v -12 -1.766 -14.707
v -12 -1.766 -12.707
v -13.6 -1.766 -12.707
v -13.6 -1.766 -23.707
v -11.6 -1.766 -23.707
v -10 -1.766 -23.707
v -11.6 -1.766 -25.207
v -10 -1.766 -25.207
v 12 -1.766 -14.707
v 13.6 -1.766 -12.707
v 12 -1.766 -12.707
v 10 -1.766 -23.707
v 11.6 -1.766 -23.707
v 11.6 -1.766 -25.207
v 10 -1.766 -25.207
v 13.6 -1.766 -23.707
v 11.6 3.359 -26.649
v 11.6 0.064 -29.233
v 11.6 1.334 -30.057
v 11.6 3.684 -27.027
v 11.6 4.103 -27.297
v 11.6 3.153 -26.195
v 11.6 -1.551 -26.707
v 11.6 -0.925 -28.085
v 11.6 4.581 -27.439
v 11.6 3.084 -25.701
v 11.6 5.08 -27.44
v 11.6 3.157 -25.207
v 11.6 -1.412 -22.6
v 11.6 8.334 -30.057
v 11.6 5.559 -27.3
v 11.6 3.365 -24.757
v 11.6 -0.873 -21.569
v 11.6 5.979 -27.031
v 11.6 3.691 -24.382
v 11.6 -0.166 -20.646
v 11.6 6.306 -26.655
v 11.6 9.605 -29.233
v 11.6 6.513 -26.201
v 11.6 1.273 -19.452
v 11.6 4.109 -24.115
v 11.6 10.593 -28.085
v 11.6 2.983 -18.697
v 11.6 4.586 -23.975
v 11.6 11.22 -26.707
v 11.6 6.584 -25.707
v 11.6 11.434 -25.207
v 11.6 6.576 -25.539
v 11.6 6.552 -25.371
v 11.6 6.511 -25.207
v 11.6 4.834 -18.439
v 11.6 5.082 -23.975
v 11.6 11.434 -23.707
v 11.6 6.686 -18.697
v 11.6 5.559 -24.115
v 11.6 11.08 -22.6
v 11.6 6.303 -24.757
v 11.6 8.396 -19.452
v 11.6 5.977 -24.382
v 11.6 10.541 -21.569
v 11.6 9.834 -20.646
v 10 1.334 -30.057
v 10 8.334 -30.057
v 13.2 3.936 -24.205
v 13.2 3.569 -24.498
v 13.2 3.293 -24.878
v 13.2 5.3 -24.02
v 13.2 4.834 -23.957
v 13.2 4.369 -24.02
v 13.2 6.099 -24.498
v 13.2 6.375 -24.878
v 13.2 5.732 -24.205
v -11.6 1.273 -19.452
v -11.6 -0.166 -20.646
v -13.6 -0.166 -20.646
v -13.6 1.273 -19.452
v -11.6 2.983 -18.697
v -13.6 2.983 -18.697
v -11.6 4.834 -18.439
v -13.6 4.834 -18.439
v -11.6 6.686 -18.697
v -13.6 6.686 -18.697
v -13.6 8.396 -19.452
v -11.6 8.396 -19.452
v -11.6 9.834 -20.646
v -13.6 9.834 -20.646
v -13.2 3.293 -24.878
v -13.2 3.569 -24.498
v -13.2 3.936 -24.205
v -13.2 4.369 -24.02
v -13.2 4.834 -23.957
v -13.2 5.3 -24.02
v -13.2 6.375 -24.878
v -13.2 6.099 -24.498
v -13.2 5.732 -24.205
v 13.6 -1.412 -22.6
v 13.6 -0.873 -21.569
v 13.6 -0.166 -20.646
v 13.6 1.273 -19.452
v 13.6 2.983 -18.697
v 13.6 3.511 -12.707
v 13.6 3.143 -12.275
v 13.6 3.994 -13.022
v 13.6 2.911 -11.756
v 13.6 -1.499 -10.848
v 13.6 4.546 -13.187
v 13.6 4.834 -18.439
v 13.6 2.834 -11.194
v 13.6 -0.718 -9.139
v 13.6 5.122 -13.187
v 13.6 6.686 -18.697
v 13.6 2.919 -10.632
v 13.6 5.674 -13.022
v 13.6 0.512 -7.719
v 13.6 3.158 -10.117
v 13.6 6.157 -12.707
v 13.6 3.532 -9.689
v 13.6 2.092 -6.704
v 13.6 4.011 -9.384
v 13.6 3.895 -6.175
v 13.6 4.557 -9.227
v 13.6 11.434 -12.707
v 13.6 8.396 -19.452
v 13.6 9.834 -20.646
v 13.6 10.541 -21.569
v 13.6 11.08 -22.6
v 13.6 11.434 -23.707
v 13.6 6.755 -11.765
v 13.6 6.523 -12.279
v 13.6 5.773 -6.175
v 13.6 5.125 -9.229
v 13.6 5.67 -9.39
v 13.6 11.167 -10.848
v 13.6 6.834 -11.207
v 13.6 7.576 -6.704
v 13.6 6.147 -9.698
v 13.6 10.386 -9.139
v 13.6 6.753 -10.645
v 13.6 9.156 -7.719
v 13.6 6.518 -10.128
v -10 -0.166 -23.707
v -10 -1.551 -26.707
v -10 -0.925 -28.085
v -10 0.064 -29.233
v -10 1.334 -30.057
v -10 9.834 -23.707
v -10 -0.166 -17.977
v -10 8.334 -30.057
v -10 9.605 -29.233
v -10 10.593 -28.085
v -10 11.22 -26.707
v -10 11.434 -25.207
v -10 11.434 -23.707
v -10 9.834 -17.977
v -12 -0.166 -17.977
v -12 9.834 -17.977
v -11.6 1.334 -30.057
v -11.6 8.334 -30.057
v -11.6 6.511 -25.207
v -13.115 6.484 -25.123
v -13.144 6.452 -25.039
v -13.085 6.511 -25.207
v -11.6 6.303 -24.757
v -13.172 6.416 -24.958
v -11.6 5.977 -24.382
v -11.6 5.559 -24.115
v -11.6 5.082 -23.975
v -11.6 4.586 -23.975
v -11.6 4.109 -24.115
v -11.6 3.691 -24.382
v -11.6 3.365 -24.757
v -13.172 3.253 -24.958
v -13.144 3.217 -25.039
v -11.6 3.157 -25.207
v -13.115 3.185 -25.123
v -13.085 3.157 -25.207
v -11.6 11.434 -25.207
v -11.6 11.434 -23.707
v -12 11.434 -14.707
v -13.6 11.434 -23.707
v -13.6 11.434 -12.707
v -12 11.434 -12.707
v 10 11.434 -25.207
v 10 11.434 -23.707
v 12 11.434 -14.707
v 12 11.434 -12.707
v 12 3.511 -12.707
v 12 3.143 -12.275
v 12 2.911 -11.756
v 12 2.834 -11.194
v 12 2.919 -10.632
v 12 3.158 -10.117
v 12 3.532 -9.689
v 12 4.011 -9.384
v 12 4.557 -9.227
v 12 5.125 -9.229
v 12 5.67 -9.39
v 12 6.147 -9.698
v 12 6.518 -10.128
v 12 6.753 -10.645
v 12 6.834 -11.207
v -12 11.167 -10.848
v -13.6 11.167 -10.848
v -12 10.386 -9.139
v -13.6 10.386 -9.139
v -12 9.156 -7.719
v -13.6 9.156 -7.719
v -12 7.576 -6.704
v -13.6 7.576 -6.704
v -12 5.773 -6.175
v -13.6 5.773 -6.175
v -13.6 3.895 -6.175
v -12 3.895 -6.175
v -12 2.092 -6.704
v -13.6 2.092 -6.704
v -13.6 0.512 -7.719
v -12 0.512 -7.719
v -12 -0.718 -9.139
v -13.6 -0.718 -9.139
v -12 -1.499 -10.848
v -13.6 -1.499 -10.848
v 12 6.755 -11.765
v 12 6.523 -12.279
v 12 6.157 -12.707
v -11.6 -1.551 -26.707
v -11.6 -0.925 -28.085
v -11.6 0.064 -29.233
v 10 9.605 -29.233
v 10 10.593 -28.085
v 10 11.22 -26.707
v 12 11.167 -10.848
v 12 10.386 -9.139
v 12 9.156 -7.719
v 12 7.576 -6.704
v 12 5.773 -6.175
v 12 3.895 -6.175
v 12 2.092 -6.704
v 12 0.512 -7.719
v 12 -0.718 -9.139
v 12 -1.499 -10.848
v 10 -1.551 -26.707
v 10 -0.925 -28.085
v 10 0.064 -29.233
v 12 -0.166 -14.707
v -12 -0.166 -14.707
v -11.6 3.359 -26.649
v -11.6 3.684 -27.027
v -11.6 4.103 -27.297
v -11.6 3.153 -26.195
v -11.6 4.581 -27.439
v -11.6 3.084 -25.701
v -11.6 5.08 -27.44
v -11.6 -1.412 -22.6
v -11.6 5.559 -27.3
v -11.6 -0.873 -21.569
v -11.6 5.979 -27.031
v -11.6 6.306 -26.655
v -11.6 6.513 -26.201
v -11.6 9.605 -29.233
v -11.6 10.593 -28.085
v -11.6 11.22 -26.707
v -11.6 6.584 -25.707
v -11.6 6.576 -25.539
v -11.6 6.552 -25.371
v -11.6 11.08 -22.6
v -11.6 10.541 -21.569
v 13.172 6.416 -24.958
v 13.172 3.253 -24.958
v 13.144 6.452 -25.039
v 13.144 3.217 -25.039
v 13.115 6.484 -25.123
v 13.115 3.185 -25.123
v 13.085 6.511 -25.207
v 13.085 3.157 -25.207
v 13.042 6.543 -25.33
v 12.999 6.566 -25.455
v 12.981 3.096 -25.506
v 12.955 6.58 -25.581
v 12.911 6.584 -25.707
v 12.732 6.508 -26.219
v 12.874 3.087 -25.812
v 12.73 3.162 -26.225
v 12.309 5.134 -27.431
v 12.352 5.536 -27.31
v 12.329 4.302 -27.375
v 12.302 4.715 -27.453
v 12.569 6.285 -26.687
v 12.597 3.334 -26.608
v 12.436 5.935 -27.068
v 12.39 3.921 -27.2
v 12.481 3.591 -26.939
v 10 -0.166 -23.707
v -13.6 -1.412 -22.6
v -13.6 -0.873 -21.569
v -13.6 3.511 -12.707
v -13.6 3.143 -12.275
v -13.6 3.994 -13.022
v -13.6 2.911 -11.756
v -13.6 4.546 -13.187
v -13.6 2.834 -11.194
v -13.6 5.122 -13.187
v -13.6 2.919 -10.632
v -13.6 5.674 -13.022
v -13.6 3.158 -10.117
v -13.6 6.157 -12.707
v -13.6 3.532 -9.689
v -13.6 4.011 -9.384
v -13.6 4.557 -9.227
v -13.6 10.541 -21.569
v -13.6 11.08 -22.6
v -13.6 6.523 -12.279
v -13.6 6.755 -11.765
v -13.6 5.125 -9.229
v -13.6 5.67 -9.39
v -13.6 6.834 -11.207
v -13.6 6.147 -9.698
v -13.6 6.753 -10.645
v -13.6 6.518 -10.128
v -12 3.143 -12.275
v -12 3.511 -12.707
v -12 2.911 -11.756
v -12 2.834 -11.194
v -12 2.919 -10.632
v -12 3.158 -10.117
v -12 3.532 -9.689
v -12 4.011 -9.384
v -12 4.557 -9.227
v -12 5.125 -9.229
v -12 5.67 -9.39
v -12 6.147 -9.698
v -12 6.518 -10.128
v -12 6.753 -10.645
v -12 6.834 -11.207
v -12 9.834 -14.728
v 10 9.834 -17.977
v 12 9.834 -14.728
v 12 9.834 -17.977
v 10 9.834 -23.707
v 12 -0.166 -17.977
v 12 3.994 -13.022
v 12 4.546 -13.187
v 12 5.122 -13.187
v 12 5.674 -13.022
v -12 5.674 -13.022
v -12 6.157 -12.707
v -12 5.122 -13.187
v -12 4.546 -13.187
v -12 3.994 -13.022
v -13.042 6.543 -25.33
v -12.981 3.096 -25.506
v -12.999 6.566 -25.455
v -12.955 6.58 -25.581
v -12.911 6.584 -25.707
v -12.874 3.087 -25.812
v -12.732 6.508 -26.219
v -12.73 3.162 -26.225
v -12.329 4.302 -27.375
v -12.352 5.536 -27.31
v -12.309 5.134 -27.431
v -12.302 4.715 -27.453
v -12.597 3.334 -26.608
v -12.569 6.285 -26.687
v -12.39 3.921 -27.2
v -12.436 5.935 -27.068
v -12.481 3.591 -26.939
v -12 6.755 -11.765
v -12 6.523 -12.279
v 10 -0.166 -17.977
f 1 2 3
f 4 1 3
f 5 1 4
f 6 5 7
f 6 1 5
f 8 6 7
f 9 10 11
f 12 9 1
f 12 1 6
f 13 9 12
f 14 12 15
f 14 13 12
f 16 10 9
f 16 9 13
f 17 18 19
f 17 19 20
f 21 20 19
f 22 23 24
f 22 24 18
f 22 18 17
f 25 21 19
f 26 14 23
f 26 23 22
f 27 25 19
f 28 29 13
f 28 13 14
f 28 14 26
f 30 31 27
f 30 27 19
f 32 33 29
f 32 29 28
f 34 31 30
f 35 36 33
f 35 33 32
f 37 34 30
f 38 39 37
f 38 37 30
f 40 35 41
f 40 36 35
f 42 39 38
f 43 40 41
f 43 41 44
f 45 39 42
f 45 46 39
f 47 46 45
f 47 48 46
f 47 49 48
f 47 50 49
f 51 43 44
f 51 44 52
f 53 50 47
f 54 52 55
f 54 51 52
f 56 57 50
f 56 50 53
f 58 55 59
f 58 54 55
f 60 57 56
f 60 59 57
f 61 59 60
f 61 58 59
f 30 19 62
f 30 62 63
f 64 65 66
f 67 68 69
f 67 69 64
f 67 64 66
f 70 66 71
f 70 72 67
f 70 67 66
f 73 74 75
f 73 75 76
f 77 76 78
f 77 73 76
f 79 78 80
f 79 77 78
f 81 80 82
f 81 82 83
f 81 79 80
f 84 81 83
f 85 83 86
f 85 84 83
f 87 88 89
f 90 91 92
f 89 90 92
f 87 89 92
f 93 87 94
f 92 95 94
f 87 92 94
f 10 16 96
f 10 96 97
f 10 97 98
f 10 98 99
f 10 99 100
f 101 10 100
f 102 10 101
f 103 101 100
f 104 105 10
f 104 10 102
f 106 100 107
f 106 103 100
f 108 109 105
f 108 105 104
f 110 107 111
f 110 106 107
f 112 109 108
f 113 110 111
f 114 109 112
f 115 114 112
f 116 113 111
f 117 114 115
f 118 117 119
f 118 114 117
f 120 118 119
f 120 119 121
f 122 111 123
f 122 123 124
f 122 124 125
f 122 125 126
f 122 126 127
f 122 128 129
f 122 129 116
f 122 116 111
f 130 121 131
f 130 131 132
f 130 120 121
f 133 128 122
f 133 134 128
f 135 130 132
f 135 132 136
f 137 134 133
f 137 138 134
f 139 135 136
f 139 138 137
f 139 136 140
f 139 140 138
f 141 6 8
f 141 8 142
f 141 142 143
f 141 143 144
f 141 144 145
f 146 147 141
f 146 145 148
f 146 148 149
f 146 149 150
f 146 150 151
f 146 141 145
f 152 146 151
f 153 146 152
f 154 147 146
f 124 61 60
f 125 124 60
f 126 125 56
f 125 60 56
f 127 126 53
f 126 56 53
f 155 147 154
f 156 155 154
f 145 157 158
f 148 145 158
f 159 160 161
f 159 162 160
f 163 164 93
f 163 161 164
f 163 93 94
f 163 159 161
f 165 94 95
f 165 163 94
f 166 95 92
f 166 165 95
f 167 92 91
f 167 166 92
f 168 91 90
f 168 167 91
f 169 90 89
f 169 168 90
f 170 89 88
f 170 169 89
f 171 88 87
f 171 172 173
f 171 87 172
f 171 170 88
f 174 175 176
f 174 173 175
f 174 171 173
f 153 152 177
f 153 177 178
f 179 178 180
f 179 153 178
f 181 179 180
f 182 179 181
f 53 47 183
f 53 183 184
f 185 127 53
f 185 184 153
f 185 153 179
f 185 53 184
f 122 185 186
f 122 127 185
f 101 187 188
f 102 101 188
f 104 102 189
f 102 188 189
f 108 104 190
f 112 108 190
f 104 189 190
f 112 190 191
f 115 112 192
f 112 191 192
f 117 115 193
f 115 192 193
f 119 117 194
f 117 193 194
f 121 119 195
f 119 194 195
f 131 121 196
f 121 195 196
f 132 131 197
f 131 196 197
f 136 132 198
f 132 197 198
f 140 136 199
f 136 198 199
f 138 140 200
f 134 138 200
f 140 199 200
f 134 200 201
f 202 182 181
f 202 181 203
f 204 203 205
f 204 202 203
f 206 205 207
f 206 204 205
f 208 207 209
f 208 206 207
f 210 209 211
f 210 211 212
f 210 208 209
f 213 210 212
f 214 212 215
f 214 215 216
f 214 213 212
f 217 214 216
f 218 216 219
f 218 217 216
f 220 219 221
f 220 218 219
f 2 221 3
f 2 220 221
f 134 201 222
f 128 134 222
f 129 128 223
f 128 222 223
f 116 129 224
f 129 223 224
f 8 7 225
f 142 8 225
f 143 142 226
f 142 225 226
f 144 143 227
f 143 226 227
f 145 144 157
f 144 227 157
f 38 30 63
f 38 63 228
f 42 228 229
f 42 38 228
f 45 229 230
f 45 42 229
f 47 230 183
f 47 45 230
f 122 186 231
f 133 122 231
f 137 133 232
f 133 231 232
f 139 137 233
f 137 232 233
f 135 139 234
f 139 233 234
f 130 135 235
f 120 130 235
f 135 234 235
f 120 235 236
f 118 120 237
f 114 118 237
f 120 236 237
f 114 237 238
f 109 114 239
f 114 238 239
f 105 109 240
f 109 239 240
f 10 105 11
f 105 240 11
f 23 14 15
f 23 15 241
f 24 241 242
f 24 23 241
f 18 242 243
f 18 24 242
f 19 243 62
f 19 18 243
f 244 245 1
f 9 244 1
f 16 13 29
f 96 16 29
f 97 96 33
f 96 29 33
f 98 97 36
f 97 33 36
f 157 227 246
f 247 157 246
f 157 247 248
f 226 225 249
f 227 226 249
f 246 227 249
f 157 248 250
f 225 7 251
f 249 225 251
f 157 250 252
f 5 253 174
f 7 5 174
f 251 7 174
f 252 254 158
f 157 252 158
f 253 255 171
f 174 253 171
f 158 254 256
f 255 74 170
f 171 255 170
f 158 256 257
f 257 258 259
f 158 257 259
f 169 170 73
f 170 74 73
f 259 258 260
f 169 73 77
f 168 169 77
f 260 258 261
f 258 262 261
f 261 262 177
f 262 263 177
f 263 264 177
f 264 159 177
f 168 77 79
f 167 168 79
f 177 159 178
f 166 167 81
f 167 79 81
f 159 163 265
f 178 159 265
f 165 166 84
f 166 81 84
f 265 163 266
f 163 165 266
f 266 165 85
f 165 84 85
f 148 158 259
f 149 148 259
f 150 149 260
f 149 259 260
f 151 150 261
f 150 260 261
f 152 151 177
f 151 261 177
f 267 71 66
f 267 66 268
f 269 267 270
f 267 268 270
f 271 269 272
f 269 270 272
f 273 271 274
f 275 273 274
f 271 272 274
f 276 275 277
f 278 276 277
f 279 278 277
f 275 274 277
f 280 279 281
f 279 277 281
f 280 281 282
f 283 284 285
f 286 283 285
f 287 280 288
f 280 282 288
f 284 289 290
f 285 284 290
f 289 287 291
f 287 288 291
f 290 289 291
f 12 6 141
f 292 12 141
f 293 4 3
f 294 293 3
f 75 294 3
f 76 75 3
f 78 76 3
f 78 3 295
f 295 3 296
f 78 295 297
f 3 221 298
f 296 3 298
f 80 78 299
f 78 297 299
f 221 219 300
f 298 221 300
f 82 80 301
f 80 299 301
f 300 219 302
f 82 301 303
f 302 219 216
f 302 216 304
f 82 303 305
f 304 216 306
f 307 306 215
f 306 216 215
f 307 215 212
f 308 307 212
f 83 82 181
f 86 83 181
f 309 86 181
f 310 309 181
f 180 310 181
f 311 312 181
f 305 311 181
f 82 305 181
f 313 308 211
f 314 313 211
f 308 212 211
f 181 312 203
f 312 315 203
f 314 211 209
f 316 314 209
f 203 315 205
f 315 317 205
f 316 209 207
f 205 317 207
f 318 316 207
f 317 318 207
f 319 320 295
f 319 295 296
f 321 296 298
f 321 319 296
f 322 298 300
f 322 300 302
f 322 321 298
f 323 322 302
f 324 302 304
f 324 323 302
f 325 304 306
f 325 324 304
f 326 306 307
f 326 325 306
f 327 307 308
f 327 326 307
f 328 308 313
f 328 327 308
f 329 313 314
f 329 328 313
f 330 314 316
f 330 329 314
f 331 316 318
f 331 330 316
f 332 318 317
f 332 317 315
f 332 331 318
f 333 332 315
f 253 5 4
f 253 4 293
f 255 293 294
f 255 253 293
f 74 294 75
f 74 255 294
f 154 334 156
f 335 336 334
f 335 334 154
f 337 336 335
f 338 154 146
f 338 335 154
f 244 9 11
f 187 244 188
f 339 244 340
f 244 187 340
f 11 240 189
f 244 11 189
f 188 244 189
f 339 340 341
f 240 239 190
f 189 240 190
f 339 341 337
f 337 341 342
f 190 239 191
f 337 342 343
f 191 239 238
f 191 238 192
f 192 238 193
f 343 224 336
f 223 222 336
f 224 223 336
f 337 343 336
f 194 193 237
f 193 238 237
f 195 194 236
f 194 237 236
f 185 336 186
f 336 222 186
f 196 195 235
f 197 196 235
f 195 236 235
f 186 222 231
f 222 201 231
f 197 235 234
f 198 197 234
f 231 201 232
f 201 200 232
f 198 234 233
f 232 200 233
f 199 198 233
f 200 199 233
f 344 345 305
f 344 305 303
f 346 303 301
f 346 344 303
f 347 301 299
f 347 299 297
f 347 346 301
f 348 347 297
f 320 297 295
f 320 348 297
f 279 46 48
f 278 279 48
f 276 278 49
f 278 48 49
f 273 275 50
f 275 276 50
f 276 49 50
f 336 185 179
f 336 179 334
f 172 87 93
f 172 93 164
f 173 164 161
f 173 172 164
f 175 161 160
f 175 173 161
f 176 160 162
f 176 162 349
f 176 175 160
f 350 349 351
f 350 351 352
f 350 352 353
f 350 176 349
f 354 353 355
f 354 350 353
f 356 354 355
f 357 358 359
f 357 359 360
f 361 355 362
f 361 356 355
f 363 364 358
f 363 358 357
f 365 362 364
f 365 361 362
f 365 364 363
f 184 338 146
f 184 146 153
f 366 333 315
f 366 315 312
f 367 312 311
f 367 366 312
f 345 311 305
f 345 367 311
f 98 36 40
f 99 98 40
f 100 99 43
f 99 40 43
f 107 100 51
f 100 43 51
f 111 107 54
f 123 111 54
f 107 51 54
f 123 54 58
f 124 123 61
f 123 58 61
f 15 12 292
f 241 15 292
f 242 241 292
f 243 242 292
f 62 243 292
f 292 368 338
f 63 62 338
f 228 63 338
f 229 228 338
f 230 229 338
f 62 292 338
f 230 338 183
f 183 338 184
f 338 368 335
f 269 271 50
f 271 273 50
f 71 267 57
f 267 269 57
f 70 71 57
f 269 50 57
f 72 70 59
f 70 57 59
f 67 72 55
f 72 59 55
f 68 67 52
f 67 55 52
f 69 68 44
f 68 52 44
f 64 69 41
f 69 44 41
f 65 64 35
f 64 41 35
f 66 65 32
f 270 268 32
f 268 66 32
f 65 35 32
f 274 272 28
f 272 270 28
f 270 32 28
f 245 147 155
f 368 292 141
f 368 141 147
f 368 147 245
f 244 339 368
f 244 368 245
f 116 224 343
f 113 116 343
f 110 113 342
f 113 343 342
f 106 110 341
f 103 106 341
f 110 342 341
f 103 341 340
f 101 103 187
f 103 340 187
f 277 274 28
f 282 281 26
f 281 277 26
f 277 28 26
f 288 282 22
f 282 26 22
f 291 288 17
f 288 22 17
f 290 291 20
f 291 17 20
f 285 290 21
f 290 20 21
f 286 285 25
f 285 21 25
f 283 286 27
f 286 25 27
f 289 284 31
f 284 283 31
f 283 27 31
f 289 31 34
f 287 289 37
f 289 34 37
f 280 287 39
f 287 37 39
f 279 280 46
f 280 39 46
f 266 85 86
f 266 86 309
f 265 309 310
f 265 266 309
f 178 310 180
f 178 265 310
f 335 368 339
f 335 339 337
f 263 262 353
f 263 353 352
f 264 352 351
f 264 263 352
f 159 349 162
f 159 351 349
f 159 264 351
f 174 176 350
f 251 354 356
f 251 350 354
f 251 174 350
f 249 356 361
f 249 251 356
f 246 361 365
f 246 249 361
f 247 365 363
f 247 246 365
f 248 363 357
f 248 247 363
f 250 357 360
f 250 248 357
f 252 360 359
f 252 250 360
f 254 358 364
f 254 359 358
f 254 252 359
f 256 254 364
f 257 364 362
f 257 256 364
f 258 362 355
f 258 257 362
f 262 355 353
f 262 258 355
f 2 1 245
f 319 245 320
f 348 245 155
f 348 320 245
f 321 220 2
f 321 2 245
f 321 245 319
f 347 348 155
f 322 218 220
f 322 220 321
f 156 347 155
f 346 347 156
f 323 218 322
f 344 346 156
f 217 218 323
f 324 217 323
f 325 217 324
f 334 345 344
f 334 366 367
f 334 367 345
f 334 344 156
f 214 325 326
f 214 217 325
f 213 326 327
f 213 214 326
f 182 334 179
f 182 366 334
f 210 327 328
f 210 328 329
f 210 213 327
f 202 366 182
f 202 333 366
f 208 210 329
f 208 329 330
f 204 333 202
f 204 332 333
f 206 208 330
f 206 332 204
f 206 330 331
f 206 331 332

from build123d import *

# Parameters (mm, degrees)
F2_DEPTH = 1.6
F3_DEPTH = 2
F4_DEPTH = 0.4
F5_DEPTH = 11.6
F6_DEPTH = 2
F7_DEPTH = 1.6
F9_DEPTH = 25


# Not quite as in the source:
# - a feature names something its author has since deleted; it is built from what else it names


with BuildPart() as f2:
    # F1 (on offset) → F2 (new body)
    with BuildSketch(Plane.YZ.offset(11.6)):
        with BuildLine():
            Line((-0.1658547654, -17.9765316878), (-0.1658547654, -20.645576419))
            ThreePointArc((-0.1658547654, -20.645576419), (4.8341452346, -18.4390658066), (9.8341452346, -20.645576419))
            Line((9.8341452346, -20.645576419), (9.8341452346, -17.9765316878))
            Line((9.8341452346, -17.9765316878), (-0.1658547654, -17.9765316878))
        make_face()
        with BuildLine():
            Line((-0.1658547654, -23.7073743102), (-1.7658547654, -23.7073743102))
            Line((-1.7658547654, -23.7073743102), (-1.7658547654, -25.2073743102))
            Line((-1.7658547654, -25.2073743102), (-0.1658547654, -25.2073743102))
            Line((-0.1658547654, -25.2073743102), (3.1570942515, -25.2073743102))
            ThreePointArc((3.1570942515, -25.2073743102), (4.8341452346, -23.9573743102), (6.5111962178, -25.2073743102))
            Line((6.5111962178, -25.2073743102), (9.8341452346, -25.2073743102))
            Line((9.8341452346, -25.2073743102), (11.4341452346, -25.2073743102))
            Line((11.4341452346, -25.2073743102), (11.4341452346, -23.7073743102))
            Line((11.4341452346, -23.7073743102), (9.8341452346, -23.7073743102))
            Line((9.8341452346, -23.7073743102), (9.8341452346, -20.645576419))
            ThreePointArc((9.8341452346, -20.645576419), (4.8341452346, -18.4390658066), (-0.1658547654, -20.645576419))
            Line((-0.1658547654, -20.645576419), (-0.1658547654, -23.7073743102))
        make_face()
        with BuildLine():
            Line((-0.1658547654, -25.2073743102), (-1.7658547654, -25.2073743102))
            ThreePointArc((-1.7658547654, -25.2073743102), (-0.9246460766, -28.0854161792), (1.3341452346, -30.0573743102))
            Line((1.3341452346, -30.0573743102), (8.3341452346, -30.0573743102))
            ThreePointArc((8.3341452346, -30.0573743102), (10.5929365459, -28.0854161792), (11.4341452346, -25.2073743102))
            Line((11.4341452346, -25.2073743102), (9.8341452346, -25.2073743102))
            Line((9.8341452346, -25.2073743102), (6.5111962178, -25.2073743102))
            ThreePointArc((6.5111962178, -25.2073743102), (6.5658119492, -25.4547275414), (6.5841452346, -25.7073743102))
            ThreePointArc((6.5841452346, -25.7073743102), (4.5814984659, -27.4390410247), (3.1570942515, -25.2073743102))
            Line((3.1570942515, -25.2073743102), (-0.1658547654, -25.2073743102))
        make_face()
        with BuildLine():
            Line((6.5111962178, -25.2073743102), (3.1570942515, -25.2073743102))
            ThreePointArc((3.1570942515, -25.2073743102), (4.5814984659, -27.4390410247), (6.5841452346, -25.7073743102))
            ThreePointArc((6.5841452346, -25.7073743102), (6.5658119492, -25.4547275414), (6.5111962178, -25.2073743102))
        make_face()
        with BuildLine():
            ThreePointArc((6.5111962178, -25.2073743102), (4.8341452346, -23.9573743102), (3.1570942515, -25.2073743102))
            Line((3.1570942515, -25.2073743102), (6.5111962178, -25.2073743102))
        make_face()
        with BuildLine():
            Line((9.8341452346, -23.7073743102), (11.4341452346, -23.7073743102))
            ThreePointArc((11.4341452346, -23.7073743102), (10.8327827117, -22.0726736198), (9.8341452346, -20.645576419))
            Line((9.8341452346, -20.645576419), (9.8341452346, -23.7073743102))
        make_face()
        with BuildLine():
            ThreePointArc((-0.1658547654, -20.645576419), (-1.1644922425, -22.0726736198), (-1.7658547654, -23.7073743102))
            Line((-1.7658547654, -23.7073743102), (-0.1658547654, -23.7073743102))
            Line((-0.1658547654, -23.7073743102), (-0.1658547654, -20.645576419))
        make_face()
    extrude(amount=-F2_DEPTH)

    # F1 (on offset) → F3 (join)
    with BuildSketch(Plane.YZ.offset(11.6)):
        with BuildLine():
            Line((-0.1658547654, -12.7073743102), (-1.7658547654, -12.7073743102))
            Line((-1.7658547654, -12.7073743102), (-1.7658547654, -14.7073743102))
            Line((-1.7658547654, -14.7073743102), (-0.1658547654, -14.7073743102))
            Line((-0.1658547654, -14.7073743102), (-0.1658547654, -17.9765316878))
            Line((-0.1658547654, -17.9765316878), (9.8341452346, -17.9765316878))
            Line((9.8341452346, -17.9765316878), (9.8341452346, -14.7278557842))
            Line((9.8341452346, -14.7278557842), (11.4341452346, -14.7073743102))
            Line((11.4341452346, -14.7073743102), (11.4341452346, -12.7073743102))
            Line((11.4341452346, -12.7073743102), (9.8341452346, -12.7073743102))
            Line((9.8341452346, -12.7073743102), (6.1570208902, -12.7073743102))
            ThreePointArc((6.1570208902, -12.7073743102), (4.8341452346, -13.2073743102), (3.5112695791, -12.7073743102))
            Line((3.5112695791, -12.7073743102), (-0.1658547654, -12.7073743102))
        make_face()
        with BuildLine():
            ThreePointArc((11.4341452346, -12.7073743102), (4.8341452346, -6.1073743102), (-1.7658547654, -12.7073743102))
            Line((-1.7658547654, -12.7073743102), (-0.1658547654, -12.7073743102))
            Line((-0.1658547654, -12.7073743102), (3.5112695791, -12.7073743102))
            ThreePointArc((3.5112695791, -12.7073743102), (4.0112695791, -9.3844986547), (6.8341452346, -11.2073743102))
            ThreePointArc((6.8341452346, -11.2073743102), (6.6570208902, -12.0302499657), (6.1570208902, -12.7073743102))
            Line((6.1570208902, -12.7073743102), (9.8341452346, -12.7073743102))
            Line((9.8341452346, -12.7073743102), (11.4341452346, -12.7073743102))
        make_face()
        with BuildLine():
            Line((-0.1658547654, -17.9765316878), (-0.1658547654, -20.645576419))
            ThreePointArc((-0.1658547654, -20.645576419), (4.8341452346, -18.4390658066), (9.8341452346, -20.645576419))
            Line((9.8341452346, -20.645576419), (9.8341452346, -17.9765316878))
            Line((9.8341452346, -17.9765316878), (-0.1658547654, -17.9765316878))
        make_face()
    extrude(amount=F3_DEPTH)

    # F1 (on offset) → F4 (cut)
    with BuildSketch(Plane.YZ.offset(11.6)):
        with BuildLine():
            Line((-0.1658547654, -12.7073743102), (-1.7658547654, -12.7073743102))
            Line((-1.7658547654, -12.7073743102), (-1.7658547654, -14.7073743102))
            Line((-1.7658547654, -14.7073743102), (-0.1658547654, -14.7073743102))
            Line((-0.1658547654, -14.7073743102), (-0.1658547654, -17.9765316878))
            Line((-0.1658547654, -17.9765316878), (9.8341452346, -17.9765316878))
            Line((9.8341452346, -17.9765316878), (9.8341452346, -14.7278557842))
            Line((9.8341452346, -14.7278557842), (11.4341452346, -14.7073743102))
            Line((11.4341452346, -14.7073743102), (11.4341452346, -12.7073743102))
            Line((11.4341452346, -12.7073743102), (9.8341452346, -12.7073743102))
            Line((9.8341452346, -12.7073743102), (6.1570208902, -12.7073743102))
            ThreePointArc((6.1570208902, -12.7073743102), (4.8341452346, -13.2073743102), (3.5112695791, -12.7073743102))
            Line((3.5112695791, -12.7073743102), (-0.1658547654, -12.7073743102))
        make_face()
        with BuildLine():
            ThreePointArc((11.4341452346, -12.7073743102), (4.8341452346, -6.1073743102), (-1.7658547654, -12.7073743102))
            Line((-1.7658547654, -12.7073743102), (-0.1658547654, -12.7073743102))
            Line((-0.1658547654, -12.7073743102), (3.5112695791, -12.7073743102))
            ThreePointArc((3.5112695791, -12.7073743102), (4.0112695791, -9.3844986547), (6.8341452346, -11.2073743102))
            ThreePointArc((6.8341452346, -11.2073743102), (6.6570208902, -12.0302499657), (6.1570208902, -12.7073743102))
            Line((6.1570208902, -12.7073743102), (9.8341452346, -12.7073743102))
            Line((9.8341452346, -12.7073743102), (11.4341452346, -12.7073743102))
        make_face()
    extrude(amount=F4_DEPTH, mode=Mode.SUBTRACT)



with BuildPart() as f5:
    # F1 (on offset) → F5 (new body)
    with BuildSketch(Plane.YZ.offset(11.6)):
        with BuildLine():
            Line((11.4341452346, -23.7073743102), (11.4341452346, -14.7073743102))
            Line((11.4341452346, -14.7073743102), (9.8341452346, -14.7278557842))
            Line((9.8341452346, -14.7278557842), (9.8341452346, -17.9765316878))
            Line((9.8341452346, -17.9765316878), (9.8341452346, -20.645576419))
            ThreePointArc((9.8341452346, -20.645576419), (10.8327827117, -22.0726736198), (11.4341452346, -23.7073743102))
        make_face()
        with BuildLine():
            Line((9.8341452346, -23.7073743102), (11.4341452346, -23.7073743102))
            ThreePointArc((11.4341452346, -23.7073743102), (10.8327827117, -22.0726736198), (9.8341452346, -20.645576419))
            Line((9.8341452346, -20.645576419), (9.8341452346, -23.7073743102))
        make_face()
    extrude(amount=-F5_DEPTH)


with BuildPart() as f5b:
    # F1 (on offset) → F5, piece 2 (new body)
    with BuildSketch(Plane.YZ.offset(11.6)):
        with BuildLine():
            Line((-0.1658547654, -14.7073743102), (-1.7658547654, -14.7073743102))
            Line((-1.7658547654, -14.7073743102), (-1.7658547654, -23.7073743102))
            ThreePointArc((-1.7658547654, -23.7073743102), (-1.1644922425, -22.0726736198), (-0.1658547654, -20.645576419))
            Line((-0.1658547654, -20.645576419), (-0.1658547654, -17.9765316878))
            Line((-0.1658547654, -17.9765316878), (-0.1658547654, -14.7073743102))
        make_face()
        with BuildLine():
            ThreePointArc((-0.1658547654, -20.645576419), (-1.1644922425, -22.0726736198), (-1.7658547654, -23.7073743102))
            Line((-1.7658547654, -23.7073743102), (-0.1658547654, -23.7073743102))
            Line((-0.1658547654, -23.7073743102), (-0.1658547654, -20.645576419))
        make_face()
    extrude(amount=-F5_DEPTH)


with BuildPart() as f2_1:
    add(f2.part)

    add(f5.part)  # F6 merges F5

    add(f5b.part)  # F6 merges F5b
    # F1 (on offset) → F6 (join)
    with BuildSketch(Plane.YZ.offset(11.6)):
        with BuildLine():
            Line((-0.1658547654, -14.7073743102), (-1.7658547654, -14.7073743102))
            Line((-1.7658547654, -14.7073743102), (-1.7658547654, -23.7073743102))
            ThreePointArc((-1.7658547654, -23.7073743102), (-1.1644922425, -22.0726736198), (-0.1658547654, -20.645576419))
            Line((-0.1658547654, -20.645576419), (-0.1658547654, -17.9765316878))
            Line((-0.1658547654, -17.9765316878), (-0.1658547654, -14.7073743102))
        make_face()
        with BuildLine():
            Line((11.4341452346, -23.7073743102), (11.4341452346, -14.7073743102))
            Line((11.4341452346, -14.7073743102), (9.8341452346, -14.7278557842))
            Line((9.8341452346, -14.7278557842), (9.8341452346, -17.9765316878))
            Line((9.8341452346, -17.9765316878), (9.8341452346, -20.645576419))
            ThreePointArc((9.8341452346, -20.645576419), (10.8327827117, -22.0726736198), (11.4341452346, -23.7073743102))
        make_face()
    extrude(amount=F6_DEPTH)

    # F1 (on offset) → F7 (join)
    with BuildSketch(Plane.YZ.offset(11.6)):
        with BuildLine():
            ThreePointArc((6.5111962178, -25.2073743102), (4.8341452346, -23.9573743102), (3.1570942515, -25.2073743102))
            Line((3.1570942515, -25.2073743102), (6.5111962178, -25.2073743102))
        make_face()
        with BuildLine():
            Line((6.5111962178, -25.2073743102), (3.1570942515, -25.2073743102))
            ThreePointArc((3.1570942515, -25.2073743102), (4.5814984659, -27.4390410247), (6.5841452346, -25.7073743102))
            ThreePointArc((6.5841452346, -25.7073743102), (6.5658119492, -25.4547275414), (6.5111962178, -25.2073743102))
        make_face()
    extrude(amount=F7_DEPTH)

    # F8 (on Front) → F9 (cut)
    with BuildSketch(Plane.XZ):
        Polygon((14.5103234728, -25.0094107672), (13.301373871, -24.5876735715), (12.2712288238, -27.5406818837), (13.4801784256, -27.9624190794), align=None)
    extrude(amount=-F9_DEPTH, mode=Mode.SUBTRACT)

    # F10: F2 across plane


with BuildPart() as f2_2:
    add(f2_1.part)
    add(f2_1.part.mirror(Plane.YZ))


with BuildPart() as f11_1:
    # F11: copy of F2
    add(f2_2.part)


solid = f2_2.part
